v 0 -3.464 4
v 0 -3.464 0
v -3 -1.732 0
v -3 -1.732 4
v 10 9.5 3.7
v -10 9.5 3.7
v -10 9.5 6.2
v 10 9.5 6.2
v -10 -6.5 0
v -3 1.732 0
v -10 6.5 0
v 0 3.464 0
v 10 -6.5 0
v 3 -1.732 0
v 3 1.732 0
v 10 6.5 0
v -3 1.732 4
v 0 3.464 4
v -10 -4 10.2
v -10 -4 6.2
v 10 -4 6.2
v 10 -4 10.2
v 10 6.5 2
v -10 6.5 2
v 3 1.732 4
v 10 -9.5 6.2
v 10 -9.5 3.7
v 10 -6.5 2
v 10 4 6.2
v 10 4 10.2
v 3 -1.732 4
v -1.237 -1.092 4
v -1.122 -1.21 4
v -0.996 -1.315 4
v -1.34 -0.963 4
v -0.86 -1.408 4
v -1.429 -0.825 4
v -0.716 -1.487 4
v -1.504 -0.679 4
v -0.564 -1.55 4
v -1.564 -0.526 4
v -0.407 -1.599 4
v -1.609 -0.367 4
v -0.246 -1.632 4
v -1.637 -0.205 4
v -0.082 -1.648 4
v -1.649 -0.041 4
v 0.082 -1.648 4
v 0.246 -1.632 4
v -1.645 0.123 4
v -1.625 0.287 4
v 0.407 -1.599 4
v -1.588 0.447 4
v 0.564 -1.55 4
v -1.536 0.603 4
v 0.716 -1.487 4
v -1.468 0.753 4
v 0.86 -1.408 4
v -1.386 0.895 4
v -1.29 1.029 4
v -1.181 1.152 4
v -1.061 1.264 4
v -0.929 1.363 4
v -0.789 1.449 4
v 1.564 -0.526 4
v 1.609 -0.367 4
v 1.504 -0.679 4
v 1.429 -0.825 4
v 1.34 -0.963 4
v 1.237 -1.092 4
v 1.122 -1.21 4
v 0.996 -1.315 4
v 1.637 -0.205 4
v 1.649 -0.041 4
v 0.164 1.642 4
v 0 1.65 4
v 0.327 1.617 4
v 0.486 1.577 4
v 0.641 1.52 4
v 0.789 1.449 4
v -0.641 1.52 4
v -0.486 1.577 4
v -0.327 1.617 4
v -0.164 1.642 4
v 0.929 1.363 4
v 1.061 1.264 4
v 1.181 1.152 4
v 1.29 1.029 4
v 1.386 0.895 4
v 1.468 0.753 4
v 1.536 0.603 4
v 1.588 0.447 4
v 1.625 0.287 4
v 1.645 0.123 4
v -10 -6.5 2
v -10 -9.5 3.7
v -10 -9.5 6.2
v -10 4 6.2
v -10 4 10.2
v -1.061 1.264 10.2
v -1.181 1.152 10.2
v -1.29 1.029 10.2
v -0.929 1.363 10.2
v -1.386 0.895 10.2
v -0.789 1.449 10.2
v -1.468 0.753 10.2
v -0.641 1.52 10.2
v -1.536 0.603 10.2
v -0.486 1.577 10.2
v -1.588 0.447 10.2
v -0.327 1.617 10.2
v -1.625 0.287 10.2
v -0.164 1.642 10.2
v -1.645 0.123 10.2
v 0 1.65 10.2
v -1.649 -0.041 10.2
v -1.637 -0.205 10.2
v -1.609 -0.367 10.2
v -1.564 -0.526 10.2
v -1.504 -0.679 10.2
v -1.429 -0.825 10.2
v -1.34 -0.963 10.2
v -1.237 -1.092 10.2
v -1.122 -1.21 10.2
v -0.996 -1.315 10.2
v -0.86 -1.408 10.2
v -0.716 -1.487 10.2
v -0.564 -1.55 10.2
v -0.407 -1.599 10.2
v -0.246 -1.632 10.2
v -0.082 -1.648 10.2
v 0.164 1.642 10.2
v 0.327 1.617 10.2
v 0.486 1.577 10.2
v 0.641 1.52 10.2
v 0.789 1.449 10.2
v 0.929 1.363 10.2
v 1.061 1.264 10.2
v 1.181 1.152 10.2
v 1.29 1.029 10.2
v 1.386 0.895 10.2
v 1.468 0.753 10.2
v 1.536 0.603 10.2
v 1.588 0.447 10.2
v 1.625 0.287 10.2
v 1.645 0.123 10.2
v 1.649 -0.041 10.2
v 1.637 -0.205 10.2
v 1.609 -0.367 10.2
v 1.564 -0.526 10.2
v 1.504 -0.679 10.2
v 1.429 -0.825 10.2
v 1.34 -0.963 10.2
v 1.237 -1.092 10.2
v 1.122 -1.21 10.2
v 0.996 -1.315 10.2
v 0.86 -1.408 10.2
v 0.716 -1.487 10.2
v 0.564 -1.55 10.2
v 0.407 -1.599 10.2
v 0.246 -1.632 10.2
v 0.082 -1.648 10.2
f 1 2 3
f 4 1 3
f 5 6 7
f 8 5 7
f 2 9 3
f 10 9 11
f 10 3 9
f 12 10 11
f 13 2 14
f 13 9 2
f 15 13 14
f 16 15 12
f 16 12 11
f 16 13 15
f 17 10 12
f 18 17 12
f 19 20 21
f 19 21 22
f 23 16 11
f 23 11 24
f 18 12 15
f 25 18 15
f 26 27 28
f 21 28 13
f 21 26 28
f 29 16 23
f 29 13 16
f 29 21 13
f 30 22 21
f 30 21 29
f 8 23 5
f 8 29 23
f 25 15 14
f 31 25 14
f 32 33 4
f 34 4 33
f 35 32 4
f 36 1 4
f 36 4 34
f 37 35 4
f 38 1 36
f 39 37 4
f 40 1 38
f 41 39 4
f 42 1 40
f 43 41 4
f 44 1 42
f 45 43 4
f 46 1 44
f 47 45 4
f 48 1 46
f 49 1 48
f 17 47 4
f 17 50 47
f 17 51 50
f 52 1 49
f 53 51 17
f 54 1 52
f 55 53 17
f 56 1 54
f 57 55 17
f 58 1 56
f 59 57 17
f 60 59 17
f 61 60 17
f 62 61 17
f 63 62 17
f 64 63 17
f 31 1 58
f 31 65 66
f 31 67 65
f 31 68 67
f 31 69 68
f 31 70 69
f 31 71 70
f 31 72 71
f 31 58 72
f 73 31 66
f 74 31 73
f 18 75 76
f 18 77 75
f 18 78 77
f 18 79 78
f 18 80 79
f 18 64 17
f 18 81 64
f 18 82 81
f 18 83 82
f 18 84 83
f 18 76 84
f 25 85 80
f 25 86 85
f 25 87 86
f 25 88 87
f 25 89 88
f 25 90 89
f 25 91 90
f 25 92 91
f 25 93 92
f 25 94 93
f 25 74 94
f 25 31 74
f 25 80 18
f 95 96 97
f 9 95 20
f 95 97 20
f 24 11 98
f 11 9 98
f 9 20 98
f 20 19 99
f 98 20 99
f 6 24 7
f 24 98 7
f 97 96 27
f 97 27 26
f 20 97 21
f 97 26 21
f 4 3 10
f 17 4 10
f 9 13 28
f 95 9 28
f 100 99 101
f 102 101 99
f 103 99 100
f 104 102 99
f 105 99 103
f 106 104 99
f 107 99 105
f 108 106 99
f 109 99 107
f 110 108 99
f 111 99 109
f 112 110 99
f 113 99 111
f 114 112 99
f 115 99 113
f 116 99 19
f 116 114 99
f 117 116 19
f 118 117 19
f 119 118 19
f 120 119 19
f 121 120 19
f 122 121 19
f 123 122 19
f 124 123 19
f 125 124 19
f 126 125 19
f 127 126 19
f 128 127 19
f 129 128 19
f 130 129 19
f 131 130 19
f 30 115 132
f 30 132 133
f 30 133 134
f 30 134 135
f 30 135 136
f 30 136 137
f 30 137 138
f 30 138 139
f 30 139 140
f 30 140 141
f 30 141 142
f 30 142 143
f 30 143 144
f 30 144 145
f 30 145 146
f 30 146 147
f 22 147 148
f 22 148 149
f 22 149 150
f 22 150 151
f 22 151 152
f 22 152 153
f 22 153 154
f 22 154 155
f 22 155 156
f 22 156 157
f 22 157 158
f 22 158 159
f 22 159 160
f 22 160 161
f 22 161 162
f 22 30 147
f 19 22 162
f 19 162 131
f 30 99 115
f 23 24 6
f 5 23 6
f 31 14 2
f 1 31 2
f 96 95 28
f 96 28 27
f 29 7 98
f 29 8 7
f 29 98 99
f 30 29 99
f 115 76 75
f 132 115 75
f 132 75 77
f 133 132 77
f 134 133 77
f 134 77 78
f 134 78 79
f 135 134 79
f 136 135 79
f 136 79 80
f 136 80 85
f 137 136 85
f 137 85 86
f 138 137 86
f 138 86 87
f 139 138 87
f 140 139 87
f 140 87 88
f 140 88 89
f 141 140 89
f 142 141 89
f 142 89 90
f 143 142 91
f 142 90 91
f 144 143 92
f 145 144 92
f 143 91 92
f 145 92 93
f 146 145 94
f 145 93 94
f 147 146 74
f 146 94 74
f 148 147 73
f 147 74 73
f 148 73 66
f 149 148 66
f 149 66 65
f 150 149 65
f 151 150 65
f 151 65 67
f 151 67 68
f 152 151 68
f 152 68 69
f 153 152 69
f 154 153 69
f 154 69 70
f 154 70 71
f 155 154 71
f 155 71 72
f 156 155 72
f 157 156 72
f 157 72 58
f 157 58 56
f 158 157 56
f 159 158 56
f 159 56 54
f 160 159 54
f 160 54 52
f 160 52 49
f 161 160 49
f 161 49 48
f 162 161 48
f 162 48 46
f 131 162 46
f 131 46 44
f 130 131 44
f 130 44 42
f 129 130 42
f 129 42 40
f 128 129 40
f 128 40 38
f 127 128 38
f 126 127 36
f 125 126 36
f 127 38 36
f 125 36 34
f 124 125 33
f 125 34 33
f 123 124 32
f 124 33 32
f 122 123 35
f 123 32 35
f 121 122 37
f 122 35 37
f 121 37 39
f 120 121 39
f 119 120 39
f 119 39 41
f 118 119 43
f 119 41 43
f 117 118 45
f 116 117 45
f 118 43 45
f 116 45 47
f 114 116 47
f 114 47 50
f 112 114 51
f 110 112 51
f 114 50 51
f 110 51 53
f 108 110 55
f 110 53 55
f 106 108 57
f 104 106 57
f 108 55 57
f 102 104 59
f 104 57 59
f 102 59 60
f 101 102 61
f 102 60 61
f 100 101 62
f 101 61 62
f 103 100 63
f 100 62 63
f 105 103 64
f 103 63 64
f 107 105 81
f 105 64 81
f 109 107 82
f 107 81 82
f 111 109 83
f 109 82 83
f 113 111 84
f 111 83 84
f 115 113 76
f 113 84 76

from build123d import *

# Parameters (mm, degrees)
PAD005_DEPTH    = 10
POCKET002_DEPTH = 4
SKETCH010_R     = 1.65
POCKET003_DEPTH = 6.201


with BuildPart() as part:
    # Sketch008 → Pad005 (new body, symmetric)
    with BuildSketch(Plane.YZ):
        Polygon((-6.5, 0), (-6.5, 2), (-9.5, 3.7), (-9.5, 6.2), (-4, 6.2), (-4, 10.2), (0, 10.2), (0, 0), align=None)
    pad005 = extrude(amount=PAD005_DEPTH, both=True)

    # Mirrored: Pad005 across Sketch008 V_Axis
    add(pad005.mirror(Plane(origin=(0, 0, 0), x_dir=(1, 0, 0), z_dir=(0, 1, 0))))

    # Sketch009 (on Face2 of Mirrored) → Pocket002 (cut)
    with BuildSketch(Plane.YX):
        Polygon((-1.732051, 3), (-3.464102, 0), (-1.732051, -3), (1.732051, -3), (3.464102, 0), (1.732051, 3), align=None)
    extrude(amount=-POCKET002_DEPTH, mode=Mode.SUBTRACT)

    # Sketch010 (on Face20 of Pocket002) → Pocket003 (cut, through all)
    with BuildSketch(Plane.YX.offset(-4)):
        Circle(SKETCH010_R)
    extrude(amount=-POCKET003_DEPTH, mode=Mode.SUBTRACT)


solid = part.part
